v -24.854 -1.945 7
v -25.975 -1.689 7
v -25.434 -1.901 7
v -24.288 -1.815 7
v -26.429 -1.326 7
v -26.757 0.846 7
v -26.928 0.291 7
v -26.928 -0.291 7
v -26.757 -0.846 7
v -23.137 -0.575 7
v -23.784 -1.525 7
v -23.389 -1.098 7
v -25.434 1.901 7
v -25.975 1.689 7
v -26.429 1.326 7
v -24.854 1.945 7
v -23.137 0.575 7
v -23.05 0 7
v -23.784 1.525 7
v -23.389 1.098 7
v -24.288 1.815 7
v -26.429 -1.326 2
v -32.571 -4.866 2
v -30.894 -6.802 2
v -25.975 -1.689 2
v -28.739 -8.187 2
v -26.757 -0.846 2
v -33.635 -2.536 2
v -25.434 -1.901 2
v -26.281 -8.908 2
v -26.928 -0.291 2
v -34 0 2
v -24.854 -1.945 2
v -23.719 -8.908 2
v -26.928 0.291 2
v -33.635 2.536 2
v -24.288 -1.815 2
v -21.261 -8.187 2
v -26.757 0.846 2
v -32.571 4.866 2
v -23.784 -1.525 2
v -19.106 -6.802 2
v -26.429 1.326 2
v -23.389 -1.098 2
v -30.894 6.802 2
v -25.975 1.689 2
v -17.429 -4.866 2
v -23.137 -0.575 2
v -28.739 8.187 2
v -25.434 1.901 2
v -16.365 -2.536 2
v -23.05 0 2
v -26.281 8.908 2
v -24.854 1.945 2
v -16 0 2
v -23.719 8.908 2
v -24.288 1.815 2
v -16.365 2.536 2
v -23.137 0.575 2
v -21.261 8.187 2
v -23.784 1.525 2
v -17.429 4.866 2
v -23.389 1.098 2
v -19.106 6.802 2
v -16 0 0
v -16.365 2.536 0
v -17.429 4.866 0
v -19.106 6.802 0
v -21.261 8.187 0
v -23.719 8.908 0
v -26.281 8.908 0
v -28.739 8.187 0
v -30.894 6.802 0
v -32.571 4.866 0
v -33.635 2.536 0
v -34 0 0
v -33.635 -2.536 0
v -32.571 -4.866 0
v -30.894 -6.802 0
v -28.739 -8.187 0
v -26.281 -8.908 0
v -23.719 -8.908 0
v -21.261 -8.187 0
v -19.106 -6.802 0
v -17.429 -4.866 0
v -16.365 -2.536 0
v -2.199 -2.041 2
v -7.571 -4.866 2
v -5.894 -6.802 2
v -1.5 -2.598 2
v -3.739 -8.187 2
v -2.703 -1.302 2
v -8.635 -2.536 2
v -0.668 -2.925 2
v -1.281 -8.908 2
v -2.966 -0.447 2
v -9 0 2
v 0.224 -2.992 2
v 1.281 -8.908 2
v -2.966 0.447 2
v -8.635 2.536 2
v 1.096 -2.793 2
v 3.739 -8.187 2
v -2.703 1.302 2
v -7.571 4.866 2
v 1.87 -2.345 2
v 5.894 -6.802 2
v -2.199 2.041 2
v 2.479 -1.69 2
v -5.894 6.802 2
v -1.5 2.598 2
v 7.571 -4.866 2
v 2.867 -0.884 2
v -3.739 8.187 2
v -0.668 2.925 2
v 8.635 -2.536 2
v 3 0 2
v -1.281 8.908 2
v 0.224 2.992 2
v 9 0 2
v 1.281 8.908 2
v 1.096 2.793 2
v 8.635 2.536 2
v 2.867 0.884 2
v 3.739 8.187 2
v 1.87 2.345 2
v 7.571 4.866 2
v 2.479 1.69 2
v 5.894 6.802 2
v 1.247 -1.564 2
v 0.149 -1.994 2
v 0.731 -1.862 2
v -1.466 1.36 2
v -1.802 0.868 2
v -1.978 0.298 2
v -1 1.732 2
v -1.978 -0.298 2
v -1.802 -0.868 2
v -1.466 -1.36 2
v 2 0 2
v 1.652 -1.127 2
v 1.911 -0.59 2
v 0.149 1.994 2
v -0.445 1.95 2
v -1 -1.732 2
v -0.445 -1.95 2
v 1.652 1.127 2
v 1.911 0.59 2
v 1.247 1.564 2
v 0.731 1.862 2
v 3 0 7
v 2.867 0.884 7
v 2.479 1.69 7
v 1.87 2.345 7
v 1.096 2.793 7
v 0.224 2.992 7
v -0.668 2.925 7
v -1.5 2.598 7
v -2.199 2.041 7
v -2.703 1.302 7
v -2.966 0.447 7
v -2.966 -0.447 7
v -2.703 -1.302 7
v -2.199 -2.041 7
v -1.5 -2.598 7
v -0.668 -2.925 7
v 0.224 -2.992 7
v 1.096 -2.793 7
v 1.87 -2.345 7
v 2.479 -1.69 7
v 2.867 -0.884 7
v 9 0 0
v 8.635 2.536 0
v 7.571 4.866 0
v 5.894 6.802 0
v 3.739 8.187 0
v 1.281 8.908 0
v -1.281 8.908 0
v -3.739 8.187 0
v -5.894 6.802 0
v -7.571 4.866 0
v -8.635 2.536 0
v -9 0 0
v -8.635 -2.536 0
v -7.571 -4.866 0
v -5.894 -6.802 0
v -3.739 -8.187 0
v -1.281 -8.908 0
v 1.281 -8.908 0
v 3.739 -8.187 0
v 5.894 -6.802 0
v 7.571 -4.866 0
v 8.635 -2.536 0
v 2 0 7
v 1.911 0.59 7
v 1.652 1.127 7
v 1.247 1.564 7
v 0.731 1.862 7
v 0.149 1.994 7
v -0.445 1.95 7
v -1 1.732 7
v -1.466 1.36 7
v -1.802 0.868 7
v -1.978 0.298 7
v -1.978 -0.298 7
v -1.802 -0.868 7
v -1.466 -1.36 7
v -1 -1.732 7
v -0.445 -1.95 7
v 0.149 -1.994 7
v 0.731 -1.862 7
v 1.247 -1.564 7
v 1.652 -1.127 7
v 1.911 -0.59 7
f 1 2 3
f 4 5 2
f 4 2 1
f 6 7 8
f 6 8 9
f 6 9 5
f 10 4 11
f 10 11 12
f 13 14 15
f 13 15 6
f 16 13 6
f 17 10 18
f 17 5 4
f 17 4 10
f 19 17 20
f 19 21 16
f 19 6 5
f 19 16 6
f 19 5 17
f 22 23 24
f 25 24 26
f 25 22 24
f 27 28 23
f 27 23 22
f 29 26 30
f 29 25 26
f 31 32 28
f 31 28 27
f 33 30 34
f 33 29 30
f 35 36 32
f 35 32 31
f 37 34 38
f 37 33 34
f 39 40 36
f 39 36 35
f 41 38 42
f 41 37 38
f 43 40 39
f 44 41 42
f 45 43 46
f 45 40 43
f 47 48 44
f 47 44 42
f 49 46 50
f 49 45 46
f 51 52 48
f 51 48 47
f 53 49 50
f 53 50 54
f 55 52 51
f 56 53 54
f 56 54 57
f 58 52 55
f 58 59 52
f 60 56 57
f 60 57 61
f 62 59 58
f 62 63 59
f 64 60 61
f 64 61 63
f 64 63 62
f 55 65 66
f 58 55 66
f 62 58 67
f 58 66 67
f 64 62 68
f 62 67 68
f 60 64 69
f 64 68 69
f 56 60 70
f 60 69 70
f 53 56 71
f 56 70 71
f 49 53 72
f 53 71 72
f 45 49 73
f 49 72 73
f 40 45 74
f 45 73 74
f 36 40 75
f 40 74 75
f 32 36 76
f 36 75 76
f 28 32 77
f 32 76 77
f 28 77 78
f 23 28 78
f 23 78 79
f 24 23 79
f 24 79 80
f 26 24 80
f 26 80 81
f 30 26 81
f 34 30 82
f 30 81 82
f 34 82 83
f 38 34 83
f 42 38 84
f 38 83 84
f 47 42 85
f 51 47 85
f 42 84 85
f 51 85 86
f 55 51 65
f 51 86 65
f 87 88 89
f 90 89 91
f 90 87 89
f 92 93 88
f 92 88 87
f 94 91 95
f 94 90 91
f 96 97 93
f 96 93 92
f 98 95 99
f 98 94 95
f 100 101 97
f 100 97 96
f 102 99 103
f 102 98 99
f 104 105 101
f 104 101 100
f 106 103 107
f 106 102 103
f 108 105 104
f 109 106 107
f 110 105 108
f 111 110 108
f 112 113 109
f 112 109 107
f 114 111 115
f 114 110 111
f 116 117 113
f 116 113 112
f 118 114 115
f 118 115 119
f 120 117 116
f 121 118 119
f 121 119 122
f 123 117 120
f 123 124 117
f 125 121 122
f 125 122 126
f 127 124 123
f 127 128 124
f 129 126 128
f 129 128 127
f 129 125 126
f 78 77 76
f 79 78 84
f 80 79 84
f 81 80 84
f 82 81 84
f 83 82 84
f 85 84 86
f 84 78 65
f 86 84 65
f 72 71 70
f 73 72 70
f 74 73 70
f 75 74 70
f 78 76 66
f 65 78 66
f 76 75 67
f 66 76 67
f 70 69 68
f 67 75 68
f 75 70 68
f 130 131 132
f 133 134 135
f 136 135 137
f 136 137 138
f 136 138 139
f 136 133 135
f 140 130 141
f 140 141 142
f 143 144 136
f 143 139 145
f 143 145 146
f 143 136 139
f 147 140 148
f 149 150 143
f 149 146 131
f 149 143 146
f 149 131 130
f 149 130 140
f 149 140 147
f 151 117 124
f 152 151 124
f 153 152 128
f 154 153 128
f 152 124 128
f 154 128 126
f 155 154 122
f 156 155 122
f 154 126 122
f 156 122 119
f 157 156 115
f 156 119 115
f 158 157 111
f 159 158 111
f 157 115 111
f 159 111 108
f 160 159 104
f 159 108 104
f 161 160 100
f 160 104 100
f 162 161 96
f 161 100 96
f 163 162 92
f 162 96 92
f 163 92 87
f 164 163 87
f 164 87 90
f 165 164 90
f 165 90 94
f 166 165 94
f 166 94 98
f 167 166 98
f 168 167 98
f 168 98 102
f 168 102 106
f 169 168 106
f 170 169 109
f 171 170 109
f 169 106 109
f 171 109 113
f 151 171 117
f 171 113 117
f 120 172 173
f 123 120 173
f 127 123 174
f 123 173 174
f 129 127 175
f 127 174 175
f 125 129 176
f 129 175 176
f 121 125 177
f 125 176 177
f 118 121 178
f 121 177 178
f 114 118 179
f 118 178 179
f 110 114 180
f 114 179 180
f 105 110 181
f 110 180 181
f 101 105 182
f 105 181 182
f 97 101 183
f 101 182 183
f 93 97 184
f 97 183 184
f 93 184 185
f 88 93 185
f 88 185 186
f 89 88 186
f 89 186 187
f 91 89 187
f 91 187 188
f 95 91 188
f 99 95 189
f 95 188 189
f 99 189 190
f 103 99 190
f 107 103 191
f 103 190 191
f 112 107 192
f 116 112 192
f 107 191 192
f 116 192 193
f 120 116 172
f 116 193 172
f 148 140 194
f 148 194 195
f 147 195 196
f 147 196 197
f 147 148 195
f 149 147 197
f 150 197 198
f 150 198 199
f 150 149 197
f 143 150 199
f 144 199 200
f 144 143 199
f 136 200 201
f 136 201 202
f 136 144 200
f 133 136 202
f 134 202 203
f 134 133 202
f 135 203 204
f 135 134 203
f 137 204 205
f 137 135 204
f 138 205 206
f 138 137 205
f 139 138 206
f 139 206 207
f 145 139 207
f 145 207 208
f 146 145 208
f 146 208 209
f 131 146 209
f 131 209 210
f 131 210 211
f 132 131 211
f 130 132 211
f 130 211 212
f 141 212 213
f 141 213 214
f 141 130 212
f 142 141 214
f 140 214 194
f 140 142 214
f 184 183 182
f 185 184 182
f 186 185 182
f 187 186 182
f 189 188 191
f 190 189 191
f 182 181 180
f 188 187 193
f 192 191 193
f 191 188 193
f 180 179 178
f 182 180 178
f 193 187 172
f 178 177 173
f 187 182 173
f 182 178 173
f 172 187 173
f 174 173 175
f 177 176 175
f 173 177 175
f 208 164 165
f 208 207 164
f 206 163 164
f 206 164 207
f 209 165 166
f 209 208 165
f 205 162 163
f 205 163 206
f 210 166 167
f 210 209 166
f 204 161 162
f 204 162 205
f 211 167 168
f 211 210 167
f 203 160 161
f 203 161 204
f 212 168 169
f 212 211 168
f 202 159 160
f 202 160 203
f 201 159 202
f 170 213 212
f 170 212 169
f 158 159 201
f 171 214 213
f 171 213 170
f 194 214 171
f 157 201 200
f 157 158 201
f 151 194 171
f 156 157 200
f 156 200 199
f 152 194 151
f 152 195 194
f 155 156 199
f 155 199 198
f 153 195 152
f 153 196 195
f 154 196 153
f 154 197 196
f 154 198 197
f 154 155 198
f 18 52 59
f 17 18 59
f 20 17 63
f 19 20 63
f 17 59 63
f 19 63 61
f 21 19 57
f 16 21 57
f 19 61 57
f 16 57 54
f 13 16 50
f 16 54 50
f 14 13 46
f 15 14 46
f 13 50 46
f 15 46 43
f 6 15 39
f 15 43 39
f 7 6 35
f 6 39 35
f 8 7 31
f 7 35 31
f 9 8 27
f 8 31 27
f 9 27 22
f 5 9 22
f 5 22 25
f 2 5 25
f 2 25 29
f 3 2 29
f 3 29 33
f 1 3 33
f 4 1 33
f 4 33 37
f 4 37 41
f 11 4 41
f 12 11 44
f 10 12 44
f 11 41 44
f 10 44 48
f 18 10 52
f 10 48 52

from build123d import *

# Parameters (mm, degrees)
F0_R     = 9
F1_DEPTH = 2
F2_R     = 3
F2_R_2   = 2
F3_DEPTH = 5
F4_R     = 1.95
F5_DEPTH = 5


with BuildPart() as f1:
    # F0 (on Top) → F1 (new body)
    with BuildSketch(Plane.XY):
        Circle(F0_R)
        with Locations((-25, 0)):
            Circle(F0_R)
    extrude(amount=F1_DEPTH)

    # F2 (on face) → F3 (join)
    with BuildSketch(Plane.XY.offset(2)):
        Circle(F2_R)
        Circle(F2_R_2, mode=Mode.SUBTRACT)
    extrude(amount=F3_DEPTH)

    # F4 (on face) → F5 (join)
    with BuildSketch(Plane.XY.offset(2)):
        with Locations((-25, 0)):
            Circle(F4_R)
    extrude(amount=F5_DEPTH)


solid = f1.part
